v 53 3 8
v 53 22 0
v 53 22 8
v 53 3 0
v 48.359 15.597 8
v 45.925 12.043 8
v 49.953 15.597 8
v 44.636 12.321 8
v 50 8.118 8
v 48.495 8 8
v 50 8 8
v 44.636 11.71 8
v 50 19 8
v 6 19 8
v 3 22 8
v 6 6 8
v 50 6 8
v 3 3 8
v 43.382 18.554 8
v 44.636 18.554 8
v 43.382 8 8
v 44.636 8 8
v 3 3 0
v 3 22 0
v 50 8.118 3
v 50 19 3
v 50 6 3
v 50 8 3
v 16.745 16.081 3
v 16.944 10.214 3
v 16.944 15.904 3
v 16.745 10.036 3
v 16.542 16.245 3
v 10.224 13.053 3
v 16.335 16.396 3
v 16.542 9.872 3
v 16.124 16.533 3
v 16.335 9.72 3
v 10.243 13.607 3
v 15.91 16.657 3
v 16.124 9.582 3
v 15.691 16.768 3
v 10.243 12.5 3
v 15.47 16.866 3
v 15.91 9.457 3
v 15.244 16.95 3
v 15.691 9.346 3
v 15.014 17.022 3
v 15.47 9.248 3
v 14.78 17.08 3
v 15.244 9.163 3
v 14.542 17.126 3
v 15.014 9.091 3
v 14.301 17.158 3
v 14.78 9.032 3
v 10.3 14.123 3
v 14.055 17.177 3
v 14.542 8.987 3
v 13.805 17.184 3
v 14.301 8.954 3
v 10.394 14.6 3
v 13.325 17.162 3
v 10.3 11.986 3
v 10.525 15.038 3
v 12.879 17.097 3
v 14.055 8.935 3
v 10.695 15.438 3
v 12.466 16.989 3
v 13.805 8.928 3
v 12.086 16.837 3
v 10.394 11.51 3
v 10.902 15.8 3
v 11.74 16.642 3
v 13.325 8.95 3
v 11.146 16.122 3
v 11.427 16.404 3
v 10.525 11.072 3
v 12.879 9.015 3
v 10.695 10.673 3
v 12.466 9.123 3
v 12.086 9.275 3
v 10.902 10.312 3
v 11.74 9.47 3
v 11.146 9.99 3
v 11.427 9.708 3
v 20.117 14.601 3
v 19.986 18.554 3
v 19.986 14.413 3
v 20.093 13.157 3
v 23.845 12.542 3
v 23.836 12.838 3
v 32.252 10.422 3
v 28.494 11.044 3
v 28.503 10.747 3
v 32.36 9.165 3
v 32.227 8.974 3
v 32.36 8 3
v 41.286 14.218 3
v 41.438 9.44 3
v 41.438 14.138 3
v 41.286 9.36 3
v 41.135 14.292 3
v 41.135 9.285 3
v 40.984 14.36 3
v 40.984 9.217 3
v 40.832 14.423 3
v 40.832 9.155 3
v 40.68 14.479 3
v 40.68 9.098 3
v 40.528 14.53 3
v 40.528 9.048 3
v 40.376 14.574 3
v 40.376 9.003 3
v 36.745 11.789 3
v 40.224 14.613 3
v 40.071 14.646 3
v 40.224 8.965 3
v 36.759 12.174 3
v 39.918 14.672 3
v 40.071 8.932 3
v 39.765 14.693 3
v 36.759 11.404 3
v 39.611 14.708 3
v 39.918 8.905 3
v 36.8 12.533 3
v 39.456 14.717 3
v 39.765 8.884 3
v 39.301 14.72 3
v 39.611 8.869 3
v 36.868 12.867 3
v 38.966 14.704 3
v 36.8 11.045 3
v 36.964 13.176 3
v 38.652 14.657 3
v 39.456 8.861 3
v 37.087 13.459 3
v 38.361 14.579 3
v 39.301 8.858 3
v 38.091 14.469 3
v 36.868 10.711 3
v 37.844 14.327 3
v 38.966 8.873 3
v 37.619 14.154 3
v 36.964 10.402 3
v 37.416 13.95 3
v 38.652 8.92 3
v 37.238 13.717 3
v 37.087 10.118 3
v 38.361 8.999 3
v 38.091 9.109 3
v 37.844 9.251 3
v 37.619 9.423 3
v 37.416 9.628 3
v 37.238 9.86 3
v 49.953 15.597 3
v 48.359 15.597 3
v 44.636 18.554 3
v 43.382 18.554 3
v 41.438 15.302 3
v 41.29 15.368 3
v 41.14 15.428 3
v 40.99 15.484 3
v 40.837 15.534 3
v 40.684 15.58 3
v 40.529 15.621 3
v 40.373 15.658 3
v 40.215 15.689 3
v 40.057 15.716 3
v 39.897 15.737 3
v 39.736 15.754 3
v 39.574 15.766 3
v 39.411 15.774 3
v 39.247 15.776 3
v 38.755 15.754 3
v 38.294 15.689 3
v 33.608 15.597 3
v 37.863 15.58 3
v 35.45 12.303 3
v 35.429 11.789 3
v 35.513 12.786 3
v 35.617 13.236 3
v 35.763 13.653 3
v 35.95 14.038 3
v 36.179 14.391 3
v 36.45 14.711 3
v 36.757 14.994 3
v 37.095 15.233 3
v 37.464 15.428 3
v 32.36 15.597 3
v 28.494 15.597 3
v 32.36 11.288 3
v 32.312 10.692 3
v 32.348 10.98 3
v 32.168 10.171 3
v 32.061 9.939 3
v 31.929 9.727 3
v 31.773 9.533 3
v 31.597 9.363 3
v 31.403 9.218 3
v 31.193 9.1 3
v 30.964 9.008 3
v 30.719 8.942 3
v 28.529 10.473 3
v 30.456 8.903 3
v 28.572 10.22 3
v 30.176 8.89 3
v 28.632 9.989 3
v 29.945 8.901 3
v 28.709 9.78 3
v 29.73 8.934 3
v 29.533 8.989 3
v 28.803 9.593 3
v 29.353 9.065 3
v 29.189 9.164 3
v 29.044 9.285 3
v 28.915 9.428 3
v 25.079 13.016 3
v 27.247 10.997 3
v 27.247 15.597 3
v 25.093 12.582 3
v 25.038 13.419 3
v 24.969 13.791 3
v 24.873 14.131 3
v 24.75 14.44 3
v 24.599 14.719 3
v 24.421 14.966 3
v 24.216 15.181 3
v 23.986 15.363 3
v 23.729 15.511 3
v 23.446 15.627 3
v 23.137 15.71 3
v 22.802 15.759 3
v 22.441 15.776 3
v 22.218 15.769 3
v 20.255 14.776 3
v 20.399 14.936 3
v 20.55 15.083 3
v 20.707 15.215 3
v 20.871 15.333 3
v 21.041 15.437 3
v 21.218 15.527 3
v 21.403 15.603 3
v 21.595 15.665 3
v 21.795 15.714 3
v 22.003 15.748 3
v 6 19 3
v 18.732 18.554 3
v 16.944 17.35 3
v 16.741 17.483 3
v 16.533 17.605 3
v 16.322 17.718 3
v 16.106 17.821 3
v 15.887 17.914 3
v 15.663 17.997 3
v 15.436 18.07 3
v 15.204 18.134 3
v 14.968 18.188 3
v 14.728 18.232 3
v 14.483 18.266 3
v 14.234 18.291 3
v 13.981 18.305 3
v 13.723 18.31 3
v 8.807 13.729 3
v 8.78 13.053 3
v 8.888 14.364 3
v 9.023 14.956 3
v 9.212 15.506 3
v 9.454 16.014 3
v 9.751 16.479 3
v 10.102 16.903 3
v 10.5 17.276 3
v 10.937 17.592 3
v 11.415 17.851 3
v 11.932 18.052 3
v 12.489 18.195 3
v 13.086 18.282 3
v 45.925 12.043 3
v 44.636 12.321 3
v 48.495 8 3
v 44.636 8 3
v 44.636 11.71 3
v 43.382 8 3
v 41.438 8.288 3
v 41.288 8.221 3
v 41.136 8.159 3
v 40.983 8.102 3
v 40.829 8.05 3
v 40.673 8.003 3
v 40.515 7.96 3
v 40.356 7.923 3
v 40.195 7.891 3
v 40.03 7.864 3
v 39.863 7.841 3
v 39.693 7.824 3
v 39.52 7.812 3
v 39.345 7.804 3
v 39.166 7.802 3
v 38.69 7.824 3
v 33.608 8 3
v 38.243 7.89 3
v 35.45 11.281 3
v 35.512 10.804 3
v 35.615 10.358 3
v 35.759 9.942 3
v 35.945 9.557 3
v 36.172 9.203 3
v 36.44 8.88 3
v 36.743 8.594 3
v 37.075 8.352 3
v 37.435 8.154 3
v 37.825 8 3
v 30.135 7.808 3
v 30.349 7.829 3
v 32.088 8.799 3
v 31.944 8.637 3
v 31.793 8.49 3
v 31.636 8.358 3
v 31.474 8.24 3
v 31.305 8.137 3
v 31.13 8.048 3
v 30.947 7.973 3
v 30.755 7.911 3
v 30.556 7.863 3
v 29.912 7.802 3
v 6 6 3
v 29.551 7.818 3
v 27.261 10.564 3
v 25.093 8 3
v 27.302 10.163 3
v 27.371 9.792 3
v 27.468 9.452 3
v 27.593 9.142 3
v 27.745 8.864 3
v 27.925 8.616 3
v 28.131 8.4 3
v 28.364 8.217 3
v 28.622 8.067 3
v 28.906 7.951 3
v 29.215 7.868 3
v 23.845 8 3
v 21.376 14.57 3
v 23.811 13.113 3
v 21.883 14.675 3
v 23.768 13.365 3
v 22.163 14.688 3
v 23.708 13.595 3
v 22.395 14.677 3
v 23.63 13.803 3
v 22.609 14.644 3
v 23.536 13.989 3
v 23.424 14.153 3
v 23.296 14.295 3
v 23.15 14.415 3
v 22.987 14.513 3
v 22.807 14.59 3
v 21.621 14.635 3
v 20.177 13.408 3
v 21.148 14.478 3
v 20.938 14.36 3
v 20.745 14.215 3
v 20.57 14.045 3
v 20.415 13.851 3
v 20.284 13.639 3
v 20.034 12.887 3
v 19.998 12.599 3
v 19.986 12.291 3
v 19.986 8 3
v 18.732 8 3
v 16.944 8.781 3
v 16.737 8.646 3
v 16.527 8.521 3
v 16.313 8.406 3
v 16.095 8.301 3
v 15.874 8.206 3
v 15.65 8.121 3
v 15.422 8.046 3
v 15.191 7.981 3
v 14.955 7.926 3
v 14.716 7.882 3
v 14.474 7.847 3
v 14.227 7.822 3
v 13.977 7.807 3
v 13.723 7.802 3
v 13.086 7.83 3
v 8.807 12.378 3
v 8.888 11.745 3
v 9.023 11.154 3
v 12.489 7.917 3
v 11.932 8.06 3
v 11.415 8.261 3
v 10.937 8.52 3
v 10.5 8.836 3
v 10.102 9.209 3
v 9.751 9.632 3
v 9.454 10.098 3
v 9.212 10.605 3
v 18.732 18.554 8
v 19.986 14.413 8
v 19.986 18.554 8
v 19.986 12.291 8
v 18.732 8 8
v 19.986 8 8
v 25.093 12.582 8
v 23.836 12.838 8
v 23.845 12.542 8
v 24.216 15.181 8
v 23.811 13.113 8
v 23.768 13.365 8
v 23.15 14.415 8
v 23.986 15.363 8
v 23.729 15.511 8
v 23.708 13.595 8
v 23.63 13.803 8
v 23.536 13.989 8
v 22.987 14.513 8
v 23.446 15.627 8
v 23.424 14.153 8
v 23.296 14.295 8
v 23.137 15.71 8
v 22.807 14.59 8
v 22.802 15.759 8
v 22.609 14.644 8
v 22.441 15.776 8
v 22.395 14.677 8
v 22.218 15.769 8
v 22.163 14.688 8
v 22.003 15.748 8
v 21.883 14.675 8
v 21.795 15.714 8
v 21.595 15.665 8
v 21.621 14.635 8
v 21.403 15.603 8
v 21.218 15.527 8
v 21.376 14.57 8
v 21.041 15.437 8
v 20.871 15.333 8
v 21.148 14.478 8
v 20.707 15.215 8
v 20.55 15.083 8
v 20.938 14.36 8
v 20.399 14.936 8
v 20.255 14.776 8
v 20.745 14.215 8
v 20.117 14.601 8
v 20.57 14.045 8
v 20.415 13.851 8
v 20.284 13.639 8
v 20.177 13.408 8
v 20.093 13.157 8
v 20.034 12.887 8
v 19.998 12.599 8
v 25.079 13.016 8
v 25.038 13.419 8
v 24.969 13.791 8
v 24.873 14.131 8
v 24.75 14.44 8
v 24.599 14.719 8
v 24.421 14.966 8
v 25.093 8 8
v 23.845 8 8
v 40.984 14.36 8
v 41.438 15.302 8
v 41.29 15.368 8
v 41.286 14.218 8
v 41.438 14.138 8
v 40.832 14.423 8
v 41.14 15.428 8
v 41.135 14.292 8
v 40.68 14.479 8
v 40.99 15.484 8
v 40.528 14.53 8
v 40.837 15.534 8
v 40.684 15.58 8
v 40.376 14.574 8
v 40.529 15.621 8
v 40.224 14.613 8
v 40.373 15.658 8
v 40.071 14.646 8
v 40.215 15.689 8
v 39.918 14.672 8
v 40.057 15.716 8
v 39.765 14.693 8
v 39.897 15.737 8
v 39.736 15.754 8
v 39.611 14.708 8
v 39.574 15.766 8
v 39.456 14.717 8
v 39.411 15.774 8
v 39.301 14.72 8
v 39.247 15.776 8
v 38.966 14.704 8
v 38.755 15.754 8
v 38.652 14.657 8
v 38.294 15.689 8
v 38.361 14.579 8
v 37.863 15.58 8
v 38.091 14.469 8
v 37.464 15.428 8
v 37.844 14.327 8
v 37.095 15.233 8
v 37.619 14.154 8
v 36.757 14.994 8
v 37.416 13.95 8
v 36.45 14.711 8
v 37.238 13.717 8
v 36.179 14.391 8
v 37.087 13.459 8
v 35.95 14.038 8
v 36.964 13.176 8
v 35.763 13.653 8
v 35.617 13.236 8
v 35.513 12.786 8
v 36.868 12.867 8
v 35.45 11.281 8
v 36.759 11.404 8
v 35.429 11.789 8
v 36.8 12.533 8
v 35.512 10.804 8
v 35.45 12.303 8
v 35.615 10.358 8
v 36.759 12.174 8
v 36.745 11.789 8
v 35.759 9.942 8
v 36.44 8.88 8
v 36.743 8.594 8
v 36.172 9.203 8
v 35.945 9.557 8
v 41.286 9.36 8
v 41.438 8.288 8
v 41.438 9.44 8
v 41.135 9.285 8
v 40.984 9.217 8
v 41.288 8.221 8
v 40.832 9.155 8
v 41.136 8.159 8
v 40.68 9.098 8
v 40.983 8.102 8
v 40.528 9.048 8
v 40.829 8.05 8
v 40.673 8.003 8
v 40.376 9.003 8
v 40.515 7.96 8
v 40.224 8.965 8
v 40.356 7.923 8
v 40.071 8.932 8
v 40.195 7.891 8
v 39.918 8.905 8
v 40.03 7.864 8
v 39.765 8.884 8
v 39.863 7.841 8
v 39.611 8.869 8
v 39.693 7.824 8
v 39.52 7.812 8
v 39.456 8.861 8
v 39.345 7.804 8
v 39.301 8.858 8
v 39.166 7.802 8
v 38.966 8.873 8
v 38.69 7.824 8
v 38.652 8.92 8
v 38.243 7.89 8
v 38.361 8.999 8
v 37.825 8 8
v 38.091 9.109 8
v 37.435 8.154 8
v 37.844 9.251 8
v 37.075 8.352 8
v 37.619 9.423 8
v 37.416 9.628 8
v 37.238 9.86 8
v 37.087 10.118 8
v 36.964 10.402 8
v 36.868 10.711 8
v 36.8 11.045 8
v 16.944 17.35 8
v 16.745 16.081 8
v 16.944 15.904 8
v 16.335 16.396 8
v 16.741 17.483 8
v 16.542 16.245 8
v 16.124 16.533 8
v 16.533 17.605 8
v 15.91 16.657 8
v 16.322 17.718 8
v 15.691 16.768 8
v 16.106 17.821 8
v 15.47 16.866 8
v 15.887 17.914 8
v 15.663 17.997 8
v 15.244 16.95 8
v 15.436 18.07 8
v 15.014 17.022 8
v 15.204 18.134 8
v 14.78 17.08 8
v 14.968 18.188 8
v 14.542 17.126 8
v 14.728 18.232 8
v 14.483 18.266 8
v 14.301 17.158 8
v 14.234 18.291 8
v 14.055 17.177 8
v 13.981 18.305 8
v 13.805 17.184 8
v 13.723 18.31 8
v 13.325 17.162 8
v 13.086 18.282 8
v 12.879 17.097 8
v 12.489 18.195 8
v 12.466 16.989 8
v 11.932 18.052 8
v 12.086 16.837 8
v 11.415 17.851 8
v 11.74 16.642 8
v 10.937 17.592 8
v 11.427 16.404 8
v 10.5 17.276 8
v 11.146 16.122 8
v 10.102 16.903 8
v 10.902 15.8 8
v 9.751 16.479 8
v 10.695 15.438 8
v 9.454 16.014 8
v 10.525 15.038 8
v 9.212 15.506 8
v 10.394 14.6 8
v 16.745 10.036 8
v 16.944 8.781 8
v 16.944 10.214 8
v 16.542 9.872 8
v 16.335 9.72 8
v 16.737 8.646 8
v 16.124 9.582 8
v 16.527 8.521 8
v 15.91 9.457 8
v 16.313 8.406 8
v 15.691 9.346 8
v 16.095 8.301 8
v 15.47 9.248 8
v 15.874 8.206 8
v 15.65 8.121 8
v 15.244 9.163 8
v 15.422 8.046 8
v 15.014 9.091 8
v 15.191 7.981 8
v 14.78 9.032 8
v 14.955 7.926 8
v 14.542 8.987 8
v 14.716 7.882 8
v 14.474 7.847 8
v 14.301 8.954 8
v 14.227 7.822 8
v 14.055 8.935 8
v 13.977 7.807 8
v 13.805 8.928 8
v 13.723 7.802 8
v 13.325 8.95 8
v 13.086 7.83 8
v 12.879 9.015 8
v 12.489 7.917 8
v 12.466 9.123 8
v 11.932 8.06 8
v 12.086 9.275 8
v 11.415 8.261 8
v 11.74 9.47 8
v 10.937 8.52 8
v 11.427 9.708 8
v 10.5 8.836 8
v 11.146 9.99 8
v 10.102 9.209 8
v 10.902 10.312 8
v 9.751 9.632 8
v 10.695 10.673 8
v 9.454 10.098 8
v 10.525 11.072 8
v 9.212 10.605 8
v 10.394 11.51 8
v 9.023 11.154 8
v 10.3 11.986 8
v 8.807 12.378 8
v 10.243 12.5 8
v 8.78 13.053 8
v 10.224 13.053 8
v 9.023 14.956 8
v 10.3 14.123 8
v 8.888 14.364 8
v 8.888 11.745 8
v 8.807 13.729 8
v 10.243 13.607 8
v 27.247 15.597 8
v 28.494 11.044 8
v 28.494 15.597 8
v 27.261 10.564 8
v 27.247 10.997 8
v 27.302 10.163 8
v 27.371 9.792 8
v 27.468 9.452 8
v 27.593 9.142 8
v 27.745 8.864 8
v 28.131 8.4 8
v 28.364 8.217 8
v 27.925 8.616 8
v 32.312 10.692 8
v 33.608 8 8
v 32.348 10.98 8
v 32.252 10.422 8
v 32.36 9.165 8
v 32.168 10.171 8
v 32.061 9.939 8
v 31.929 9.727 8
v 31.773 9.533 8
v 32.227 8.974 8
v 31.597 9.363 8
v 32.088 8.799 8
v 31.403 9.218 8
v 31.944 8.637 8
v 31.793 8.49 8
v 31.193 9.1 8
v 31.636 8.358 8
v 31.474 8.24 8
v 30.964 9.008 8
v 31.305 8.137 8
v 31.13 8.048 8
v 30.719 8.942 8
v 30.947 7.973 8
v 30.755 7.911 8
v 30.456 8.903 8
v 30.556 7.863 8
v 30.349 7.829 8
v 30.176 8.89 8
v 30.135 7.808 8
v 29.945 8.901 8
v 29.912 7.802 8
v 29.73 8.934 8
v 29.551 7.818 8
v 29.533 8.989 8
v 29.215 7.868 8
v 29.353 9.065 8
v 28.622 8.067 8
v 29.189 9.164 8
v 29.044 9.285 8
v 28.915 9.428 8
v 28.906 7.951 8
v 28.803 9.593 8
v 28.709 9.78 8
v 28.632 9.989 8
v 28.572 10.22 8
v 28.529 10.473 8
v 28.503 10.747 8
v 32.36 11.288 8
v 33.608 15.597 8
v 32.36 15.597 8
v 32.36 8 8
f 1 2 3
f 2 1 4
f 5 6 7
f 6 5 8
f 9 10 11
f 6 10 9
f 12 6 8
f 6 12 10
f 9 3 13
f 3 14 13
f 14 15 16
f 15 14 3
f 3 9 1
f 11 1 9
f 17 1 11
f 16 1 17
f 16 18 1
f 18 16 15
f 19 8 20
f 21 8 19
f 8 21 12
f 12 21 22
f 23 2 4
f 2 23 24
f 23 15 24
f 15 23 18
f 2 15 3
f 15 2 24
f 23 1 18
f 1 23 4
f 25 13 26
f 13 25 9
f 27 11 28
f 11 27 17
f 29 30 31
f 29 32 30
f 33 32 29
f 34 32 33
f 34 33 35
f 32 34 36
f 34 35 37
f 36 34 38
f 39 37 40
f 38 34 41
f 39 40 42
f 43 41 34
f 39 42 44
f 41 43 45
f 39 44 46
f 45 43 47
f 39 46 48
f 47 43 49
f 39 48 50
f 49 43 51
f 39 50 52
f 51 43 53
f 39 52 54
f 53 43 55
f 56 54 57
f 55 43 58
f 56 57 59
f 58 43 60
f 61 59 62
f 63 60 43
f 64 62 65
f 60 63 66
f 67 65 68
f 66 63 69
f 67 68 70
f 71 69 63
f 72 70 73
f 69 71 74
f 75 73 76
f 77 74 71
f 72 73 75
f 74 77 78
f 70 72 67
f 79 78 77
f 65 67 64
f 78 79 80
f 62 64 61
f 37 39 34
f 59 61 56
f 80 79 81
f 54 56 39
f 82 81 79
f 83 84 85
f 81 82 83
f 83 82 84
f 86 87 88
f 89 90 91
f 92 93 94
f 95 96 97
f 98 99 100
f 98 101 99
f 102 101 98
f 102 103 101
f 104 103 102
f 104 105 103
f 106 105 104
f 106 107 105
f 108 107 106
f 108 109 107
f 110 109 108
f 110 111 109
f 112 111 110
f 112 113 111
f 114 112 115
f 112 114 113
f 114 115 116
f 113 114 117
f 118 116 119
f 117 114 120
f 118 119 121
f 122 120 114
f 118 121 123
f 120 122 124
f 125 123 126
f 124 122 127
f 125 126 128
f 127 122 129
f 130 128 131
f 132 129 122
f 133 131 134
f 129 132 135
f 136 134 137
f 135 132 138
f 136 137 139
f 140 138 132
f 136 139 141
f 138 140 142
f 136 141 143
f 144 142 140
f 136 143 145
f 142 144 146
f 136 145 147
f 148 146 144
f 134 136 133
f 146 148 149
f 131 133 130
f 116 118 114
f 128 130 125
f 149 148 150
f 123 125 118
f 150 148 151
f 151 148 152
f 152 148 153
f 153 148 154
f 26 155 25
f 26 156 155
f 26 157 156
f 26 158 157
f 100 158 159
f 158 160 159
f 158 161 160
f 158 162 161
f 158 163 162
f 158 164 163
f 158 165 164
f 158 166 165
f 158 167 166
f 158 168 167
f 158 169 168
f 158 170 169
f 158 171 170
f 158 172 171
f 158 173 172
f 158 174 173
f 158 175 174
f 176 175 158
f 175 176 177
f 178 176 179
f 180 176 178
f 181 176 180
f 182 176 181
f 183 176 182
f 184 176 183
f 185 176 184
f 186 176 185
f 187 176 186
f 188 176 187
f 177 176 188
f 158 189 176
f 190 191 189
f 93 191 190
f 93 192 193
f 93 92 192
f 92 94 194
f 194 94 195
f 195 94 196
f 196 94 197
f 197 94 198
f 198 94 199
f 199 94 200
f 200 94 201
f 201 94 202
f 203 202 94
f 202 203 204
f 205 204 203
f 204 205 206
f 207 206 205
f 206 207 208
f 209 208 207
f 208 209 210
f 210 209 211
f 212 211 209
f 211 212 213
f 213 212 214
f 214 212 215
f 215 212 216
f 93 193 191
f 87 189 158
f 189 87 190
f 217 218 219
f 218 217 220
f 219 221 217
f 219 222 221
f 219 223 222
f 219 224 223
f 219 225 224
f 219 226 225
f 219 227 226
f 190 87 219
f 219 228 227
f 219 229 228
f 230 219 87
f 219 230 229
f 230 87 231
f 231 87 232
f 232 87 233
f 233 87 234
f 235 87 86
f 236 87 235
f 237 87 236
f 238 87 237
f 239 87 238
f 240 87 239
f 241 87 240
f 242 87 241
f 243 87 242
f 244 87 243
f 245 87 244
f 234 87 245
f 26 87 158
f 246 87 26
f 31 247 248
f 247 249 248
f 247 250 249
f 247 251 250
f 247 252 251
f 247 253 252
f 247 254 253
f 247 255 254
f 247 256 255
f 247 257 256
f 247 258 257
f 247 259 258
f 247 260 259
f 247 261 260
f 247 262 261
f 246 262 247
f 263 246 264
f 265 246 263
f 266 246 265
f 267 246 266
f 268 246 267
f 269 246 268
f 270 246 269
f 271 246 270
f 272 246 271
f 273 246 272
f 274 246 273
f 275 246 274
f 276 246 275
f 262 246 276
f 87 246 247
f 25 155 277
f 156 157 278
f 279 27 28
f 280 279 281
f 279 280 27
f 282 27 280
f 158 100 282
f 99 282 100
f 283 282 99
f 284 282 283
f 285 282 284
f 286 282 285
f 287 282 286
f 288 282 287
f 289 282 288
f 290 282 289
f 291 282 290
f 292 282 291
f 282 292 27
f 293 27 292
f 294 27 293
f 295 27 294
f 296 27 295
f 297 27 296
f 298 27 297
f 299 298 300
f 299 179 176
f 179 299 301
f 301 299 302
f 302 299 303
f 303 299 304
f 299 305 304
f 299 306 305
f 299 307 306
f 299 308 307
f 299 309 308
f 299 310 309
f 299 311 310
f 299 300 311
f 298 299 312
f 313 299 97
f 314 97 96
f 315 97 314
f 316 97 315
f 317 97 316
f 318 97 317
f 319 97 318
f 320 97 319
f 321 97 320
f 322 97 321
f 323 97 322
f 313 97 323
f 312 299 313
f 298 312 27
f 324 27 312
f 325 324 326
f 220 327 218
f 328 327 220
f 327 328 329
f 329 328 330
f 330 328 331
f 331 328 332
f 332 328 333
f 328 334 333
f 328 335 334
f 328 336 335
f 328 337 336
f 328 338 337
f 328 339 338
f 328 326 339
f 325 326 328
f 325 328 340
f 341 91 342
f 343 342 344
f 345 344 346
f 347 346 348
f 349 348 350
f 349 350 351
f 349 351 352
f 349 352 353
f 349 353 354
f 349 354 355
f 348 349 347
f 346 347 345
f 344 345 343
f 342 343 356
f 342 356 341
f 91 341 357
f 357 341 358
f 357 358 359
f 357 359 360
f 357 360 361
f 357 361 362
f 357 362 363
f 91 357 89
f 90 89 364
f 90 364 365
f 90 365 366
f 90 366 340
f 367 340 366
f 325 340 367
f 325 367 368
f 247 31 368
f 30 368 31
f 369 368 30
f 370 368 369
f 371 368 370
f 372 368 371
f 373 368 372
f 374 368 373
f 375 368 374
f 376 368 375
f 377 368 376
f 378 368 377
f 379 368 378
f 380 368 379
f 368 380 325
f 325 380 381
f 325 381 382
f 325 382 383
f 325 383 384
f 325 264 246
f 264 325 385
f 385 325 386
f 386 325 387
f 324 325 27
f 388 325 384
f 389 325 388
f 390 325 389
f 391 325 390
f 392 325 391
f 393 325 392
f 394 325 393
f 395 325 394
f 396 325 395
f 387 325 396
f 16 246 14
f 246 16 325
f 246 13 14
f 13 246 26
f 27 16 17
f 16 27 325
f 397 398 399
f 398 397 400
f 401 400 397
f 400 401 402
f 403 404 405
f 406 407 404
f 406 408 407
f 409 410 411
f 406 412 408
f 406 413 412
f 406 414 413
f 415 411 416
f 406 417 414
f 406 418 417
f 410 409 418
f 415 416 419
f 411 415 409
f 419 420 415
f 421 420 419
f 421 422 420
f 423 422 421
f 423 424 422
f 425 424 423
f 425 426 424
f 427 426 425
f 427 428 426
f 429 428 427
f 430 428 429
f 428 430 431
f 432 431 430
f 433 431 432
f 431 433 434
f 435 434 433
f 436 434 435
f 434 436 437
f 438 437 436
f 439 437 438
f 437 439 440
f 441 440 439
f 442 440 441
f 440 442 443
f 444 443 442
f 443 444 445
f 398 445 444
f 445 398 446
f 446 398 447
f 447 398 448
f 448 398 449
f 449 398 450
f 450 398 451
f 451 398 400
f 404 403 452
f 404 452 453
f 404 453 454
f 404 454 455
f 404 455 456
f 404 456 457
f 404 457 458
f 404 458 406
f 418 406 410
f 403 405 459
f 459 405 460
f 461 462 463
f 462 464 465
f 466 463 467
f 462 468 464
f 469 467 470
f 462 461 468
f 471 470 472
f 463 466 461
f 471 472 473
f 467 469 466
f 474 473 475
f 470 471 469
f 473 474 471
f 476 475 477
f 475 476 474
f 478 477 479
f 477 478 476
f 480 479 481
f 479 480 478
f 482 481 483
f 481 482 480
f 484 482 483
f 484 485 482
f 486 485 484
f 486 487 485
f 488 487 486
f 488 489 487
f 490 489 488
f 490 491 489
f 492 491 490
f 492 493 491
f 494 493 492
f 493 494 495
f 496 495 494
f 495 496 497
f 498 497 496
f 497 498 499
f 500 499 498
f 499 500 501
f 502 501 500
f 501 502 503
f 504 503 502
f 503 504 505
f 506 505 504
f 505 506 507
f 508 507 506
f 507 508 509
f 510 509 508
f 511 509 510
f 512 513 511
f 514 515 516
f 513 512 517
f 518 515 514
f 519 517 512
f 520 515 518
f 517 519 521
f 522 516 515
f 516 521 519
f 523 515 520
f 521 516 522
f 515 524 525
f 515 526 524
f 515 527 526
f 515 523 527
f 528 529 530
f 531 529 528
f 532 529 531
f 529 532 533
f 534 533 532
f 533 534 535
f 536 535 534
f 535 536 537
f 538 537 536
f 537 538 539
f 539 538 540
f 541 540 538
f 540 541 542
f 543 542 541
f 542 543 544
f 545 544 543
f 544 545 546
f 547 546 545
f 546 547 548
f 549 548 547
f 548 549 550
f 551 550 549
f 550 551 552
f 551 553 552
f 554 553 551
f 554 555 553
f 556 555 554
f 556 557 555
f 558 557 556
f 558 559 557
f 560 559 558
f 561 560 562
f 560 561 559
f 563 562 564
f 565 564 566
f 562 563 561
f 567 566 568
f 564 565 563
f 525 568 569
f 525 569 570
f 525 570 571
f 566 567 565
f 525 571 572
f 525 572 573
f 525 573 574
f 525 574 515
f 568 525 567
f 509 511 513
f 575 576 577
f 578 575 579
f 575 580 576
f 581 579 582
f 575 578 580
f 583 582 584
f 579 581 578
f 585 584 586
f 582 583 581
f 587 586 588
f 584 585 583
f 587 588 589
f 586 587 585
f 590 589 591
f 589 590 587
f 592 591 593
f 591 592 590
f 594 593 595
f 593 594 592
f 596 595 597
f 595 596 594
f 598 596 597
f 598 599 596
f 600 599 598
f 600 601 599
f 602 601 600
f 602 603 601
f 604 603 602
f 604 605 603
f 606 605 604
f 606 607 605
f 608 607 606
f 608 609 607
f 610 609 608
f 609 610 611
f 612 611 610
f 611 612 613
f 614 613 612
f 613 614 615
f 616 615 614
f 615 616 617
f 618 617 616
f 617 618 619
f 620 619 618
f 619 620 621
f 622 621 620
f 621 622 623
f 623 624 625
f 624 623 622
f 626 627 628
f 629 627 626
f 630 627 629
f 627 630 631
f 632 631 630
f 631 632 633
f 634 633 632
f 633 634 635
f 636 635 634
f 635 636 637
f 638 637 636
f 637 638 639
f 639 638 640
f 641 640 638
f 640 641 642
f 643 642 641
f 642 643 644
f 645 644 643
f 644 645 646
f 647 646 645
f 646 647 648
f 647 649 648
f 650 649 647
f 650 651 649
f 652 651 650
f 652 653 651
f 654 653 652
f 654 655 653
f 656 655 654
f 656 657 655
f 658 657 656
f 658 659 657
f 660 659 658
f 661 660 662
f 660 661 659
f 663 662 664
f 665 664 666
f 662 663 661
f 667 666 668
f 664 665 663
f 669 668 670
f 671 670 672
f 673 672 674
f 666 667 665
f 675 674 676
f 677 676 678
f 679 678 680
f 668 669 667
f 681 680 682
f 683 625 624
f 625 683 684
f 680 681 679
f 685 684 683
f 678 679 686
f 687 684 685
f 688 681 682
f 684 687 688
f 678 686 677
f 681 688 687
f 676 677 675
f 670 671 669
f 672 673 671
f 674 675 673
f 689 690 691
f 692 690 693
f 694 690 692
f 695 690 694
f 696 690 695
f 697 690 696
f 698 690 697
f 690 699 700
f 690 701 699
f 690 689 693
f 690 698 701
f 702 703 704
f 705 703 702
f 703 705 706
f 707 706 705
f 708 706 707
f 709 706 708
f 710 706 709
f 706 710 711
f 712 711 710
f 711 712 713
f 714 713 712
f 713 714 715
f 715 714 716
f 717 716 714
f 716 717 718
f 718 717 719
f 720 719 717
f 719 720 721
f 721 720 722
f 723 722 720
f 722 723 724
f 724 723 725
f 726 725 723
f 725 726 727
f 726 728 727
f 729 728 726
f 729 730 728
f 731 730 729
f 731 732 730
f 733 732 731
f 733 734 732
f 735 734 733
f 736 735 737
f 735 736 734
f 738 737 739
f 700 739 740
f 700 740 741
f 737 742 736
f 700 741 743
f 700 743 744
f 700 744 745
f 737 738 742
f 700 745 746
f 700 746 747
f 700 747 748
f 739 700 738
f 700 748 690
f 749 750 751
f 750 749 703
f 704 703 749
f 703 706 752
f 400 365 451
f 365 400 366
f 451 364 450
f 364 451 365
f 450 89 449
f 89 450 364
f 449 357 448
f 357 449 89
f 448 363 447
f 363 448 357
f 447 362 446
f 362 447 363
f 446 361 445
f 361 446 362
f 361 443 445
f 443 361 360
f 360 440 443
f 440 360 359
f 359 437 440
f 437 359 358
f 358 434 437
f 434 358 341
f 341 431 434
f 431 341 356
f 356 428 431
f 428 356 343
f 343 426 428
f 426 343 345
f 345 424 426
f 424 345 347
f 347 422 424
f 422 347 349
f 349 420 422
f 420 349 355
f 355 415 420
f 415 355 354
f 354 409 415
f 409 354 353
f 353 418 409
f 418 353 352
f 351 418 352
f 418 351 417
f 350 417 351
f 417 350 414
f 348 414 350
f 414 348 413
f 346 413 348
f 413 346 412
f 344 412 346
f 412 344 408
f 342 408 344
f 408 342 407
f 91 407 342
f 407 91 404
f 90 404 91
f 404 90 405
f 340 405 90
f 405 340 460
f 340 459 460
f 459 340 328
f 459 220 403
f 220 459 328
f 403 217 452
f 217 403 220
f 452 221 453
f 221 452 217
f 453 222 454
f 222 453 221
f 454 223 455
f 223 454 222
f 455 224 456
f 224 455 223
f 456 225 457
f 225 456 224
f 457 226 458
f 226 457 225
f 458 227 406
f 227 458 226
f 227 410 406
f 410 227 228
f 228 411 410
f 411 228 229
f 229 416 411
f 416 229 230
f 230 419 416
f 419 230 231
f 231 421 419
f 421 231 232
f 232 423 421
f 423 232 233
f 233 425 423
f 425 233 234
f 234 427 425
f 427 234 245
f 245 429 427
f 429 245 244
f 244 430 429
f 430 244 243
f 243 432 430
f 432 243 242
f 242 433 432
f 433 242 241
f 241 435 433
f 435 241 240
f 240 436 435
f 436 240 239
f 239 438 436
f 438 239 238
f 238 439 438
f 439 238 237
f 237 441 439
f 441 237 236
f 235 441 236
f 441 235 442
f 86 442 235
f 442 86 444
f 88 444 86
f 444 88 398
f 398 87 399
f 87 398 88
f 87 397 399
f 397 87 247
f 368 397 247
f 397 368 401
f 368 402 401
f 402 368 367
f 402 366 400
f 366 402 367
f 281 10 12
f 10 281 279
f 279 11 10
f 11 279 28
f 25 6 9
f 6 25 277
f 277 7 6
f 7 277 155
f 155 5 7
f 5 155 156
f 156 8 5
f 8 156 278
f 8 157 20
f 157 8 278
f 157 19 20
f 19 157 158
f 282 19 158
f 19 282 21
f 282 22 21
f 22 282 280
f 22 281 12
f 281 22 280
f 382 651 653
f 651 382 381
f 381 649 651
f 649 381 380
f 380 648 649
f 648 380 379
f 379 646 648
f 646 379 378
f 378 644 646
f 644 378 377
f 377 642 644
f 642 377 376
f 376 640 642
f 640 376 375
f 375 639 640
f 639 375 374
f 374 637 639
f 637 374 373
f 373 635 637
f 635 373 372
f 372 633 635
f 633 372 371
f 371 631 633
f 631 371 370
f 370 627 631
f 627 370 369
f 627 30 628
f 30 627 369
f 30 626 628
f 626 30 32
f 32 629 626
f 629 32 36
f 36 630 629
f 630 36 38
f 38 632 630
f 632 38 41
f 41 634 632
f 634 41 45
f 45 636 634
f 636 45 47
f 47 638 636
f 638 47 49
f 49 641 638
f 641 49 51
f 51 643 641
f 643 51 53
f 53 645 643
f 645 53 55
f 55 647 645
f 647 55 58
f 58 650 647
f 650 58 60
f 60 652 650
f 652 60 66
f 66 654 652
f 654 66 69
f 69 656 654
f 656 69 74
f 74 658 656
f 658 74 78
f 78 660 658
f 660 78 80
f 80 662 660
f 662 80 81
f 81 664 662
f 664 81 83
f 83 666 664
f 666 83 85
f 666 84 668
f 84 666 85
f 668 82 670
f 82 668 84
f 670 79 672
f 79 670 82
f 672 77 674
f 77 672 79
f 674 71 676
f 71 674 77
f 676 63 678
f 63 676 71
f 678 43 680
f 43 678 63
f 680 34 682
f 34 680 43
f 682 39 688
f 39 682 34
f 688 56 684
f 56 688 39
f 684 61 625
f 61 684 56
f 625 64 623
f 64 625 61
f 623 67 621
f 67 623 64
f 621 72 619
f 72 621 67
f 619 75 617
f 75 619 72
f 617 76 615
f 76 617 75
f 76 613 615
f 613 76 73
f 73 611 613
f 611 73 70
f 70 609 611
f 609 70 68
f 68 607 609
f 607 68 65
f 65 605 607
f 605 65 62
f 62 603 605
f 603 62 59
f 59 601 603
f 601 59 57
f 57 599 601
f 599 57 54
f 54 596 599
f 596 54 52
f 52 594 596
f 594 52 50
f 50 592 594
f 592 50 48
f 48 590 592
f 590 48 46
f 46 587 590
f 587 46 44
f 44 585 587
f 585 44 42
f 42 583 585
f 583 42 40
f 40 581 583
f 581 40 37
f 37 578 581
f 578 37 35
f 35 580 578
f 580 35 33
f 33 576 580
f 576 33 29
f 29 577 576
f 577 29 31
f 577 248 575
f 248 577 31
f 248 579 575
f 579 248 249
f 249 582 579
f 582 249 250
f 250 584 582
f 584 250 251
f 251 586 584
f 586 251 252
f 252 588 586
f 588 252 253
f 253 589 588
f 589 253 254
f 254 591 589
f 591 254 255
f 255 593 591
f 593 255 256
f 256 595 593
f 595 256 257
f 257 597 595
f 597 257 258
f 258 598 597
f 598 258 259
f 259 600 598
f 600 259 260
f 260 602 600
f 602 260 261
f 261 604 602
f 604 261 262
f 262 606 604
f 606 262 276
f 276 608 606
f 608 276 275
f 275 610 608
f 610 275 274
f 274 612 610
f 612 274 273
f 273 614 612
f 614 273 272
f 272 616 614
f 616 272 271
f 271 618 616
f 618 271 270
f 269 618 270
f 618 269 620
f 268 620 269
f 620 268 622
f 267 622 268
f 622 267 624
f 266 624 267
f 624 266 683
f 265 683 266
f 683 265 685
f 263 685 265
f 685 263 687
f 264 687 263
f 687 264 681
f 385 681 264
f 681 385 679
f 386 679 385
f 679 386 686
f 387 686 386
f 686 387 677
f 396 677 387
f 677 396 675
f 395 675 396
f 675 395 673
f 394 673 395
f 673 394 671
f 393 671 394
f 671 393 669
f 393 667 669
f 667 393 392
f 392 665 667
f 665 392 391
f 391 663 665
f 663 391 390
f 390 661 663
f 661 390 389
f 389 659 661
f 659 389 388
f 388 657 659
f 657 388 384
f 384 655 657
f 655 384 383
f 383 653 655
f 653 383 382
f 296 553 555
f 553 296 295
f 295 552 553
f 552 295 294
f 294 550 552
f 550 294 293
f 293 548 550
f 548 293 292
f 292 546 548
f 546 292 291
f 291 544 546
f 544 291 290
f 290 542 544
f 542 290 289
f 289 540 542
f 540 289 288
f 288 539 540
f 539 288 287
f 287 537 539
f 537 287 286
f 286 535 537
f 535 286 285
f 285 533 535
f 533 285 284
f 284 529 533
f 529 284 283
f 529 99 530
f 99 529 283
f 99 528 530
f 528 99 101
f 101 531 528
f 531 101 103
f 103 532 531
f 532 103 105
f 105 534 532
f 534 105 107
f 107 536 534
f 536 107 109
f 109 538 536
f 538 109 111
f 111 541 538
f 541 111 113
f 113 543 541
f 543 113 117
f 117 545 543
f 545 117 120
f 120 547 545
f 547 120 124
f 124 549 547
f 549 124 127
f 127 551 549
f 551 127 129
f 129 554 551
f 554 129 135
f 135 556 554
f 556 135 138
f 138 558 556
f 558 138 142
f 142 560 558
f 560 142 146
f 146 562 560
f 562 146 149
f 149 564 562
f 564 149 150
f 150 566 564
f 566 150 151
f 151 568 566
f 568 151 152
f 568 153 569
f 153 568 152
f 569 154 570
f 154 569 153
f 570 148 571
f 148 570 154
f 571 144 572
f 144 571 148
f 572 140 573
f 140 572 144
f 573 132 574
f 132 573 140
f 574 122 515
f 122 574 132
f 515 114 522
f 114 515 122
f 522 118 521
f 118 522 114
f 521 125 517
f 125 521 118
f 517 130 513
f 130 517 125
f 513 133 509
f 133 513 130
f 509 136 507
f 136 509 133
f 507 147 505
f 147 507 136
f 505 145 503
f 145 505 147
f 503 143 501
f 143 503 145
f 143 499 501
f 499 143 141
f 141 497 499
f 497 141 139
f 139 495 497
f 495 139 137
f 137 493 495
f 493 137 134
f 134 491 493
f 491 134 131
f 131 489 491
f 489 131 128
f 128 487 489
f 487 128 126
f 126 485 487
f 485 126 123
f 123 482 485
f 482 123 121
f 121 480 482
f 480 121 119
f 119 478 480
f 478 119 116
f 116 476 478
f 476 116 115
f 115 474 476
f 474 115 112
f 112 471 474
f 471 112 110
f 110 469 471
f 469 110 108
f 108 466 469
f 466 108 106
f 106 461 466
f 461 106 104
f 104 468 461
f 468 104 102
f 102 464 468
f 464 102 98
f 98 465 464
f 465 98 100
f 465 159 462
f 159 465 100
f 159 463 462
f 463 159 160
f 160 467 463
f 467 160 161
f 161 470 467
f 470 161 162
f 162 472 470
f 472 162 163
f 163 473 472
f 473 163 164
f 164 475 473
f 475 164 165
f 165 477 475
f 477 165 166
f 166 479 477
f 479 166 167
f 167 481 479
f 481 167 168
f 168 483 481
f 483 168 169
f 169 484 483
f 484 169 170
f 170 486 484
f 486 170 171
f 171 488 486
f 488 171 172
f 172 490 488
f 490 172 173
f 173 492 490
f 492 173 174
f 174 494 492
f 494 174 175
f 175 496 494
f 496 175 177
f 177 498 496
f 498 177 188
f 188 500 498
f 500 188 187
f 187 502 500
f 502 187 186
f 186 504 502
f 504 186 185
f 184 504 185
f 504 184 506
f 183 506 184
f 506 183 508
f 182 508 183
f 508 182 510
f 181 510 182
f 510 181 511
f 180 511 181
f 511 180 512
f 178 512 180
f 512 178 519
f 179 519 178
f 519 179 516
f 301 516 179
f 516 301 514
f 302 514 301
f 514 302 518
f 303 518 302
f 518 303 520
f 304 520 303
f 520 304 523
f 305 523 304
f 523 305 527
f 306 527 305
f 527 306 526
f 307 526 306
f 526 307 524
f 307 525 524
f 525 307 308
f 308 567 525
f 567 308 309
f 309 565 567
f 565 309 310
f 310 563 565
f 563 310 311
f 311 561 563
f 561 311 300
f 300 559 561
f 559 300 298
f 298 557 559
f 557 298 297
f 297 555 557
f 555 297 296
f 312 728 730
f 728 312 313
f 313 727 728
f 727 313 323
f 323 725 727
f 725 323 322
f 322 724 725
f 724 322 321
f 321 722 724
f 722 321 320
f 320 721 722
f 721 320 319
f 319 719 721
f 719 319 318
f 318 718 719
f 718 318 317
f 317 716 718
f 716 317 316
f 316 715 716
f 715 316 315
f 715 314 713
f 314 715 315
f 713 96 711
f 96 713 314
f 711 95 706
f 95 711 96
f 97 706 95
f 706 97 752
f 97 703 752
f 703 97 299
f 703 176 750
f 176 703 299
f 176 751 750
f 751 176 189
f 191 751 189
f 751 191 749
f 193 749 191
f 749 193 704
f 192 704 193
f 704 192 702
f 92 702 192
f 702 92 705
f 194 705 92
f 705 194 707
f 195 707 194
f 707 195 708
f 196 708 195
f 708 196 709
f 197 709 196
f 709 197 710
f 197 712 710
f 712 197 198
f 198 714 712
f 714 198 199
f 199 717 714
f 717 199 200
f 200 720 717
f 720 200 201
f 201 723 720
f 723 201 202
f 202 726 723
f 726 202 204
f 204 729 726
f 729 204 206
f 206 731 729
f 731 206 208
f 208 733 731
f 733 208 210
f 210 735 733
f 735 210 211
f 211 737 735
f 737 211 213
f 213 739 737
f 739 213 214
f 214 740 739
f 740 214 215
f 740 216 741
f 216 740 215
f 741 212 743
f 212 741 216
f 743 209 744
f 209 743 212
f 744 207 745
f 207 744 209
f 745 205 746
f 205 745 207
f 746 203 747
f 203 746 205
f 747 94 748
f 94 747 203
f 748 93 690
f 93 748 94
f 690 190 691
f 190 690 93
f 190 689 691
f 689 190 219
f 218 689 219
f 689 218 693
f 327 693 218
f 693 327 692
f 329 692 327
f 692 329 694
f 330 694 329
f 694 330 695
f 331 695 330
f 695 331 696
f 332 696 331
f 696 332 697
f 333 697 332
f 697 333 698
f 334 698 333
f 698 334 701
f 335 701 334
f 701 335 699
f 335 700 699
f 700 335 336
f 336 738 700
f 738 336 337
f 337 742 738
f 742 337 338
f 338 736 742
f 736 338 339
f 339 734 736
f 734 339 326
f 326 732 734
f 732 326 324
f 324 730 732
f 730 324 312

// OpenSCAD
//Charles Zanon
//MTU 4777 Customizer Mini Project

//Facet Number
$fn=50;

//Variable for text for customizable texts
txt="Chuck";


//Length will vary per how many characters of text
length=56;

//Width will remain constant for this font size
width=25;

//Height will vary with user input
height=8;

border = 3;
inset = 3;
base = 3;



//Cube
module base(){
translate([ border, border, 0 ])
    
    difference(){  
        cube([
            length - 2*border,
            width - 2*border,
            height
        ]);
    ;
    
    translate([ border, border, base ])
    cube([
            length - 4*border,
            width - 4*border,
            height
        ]);
    
}
}



//Text 
module sub(){
translate([ border+inset+2, border + inset+2,0]){
    
    linear_extrude( height = height ){
        
text(text=txt,
    font="Iowan Old Style:style=Roman",
    size=10,
    spacing=1
    );
        
}
}
}

module nametag();
union(){base();sub();}

{nametag();}
